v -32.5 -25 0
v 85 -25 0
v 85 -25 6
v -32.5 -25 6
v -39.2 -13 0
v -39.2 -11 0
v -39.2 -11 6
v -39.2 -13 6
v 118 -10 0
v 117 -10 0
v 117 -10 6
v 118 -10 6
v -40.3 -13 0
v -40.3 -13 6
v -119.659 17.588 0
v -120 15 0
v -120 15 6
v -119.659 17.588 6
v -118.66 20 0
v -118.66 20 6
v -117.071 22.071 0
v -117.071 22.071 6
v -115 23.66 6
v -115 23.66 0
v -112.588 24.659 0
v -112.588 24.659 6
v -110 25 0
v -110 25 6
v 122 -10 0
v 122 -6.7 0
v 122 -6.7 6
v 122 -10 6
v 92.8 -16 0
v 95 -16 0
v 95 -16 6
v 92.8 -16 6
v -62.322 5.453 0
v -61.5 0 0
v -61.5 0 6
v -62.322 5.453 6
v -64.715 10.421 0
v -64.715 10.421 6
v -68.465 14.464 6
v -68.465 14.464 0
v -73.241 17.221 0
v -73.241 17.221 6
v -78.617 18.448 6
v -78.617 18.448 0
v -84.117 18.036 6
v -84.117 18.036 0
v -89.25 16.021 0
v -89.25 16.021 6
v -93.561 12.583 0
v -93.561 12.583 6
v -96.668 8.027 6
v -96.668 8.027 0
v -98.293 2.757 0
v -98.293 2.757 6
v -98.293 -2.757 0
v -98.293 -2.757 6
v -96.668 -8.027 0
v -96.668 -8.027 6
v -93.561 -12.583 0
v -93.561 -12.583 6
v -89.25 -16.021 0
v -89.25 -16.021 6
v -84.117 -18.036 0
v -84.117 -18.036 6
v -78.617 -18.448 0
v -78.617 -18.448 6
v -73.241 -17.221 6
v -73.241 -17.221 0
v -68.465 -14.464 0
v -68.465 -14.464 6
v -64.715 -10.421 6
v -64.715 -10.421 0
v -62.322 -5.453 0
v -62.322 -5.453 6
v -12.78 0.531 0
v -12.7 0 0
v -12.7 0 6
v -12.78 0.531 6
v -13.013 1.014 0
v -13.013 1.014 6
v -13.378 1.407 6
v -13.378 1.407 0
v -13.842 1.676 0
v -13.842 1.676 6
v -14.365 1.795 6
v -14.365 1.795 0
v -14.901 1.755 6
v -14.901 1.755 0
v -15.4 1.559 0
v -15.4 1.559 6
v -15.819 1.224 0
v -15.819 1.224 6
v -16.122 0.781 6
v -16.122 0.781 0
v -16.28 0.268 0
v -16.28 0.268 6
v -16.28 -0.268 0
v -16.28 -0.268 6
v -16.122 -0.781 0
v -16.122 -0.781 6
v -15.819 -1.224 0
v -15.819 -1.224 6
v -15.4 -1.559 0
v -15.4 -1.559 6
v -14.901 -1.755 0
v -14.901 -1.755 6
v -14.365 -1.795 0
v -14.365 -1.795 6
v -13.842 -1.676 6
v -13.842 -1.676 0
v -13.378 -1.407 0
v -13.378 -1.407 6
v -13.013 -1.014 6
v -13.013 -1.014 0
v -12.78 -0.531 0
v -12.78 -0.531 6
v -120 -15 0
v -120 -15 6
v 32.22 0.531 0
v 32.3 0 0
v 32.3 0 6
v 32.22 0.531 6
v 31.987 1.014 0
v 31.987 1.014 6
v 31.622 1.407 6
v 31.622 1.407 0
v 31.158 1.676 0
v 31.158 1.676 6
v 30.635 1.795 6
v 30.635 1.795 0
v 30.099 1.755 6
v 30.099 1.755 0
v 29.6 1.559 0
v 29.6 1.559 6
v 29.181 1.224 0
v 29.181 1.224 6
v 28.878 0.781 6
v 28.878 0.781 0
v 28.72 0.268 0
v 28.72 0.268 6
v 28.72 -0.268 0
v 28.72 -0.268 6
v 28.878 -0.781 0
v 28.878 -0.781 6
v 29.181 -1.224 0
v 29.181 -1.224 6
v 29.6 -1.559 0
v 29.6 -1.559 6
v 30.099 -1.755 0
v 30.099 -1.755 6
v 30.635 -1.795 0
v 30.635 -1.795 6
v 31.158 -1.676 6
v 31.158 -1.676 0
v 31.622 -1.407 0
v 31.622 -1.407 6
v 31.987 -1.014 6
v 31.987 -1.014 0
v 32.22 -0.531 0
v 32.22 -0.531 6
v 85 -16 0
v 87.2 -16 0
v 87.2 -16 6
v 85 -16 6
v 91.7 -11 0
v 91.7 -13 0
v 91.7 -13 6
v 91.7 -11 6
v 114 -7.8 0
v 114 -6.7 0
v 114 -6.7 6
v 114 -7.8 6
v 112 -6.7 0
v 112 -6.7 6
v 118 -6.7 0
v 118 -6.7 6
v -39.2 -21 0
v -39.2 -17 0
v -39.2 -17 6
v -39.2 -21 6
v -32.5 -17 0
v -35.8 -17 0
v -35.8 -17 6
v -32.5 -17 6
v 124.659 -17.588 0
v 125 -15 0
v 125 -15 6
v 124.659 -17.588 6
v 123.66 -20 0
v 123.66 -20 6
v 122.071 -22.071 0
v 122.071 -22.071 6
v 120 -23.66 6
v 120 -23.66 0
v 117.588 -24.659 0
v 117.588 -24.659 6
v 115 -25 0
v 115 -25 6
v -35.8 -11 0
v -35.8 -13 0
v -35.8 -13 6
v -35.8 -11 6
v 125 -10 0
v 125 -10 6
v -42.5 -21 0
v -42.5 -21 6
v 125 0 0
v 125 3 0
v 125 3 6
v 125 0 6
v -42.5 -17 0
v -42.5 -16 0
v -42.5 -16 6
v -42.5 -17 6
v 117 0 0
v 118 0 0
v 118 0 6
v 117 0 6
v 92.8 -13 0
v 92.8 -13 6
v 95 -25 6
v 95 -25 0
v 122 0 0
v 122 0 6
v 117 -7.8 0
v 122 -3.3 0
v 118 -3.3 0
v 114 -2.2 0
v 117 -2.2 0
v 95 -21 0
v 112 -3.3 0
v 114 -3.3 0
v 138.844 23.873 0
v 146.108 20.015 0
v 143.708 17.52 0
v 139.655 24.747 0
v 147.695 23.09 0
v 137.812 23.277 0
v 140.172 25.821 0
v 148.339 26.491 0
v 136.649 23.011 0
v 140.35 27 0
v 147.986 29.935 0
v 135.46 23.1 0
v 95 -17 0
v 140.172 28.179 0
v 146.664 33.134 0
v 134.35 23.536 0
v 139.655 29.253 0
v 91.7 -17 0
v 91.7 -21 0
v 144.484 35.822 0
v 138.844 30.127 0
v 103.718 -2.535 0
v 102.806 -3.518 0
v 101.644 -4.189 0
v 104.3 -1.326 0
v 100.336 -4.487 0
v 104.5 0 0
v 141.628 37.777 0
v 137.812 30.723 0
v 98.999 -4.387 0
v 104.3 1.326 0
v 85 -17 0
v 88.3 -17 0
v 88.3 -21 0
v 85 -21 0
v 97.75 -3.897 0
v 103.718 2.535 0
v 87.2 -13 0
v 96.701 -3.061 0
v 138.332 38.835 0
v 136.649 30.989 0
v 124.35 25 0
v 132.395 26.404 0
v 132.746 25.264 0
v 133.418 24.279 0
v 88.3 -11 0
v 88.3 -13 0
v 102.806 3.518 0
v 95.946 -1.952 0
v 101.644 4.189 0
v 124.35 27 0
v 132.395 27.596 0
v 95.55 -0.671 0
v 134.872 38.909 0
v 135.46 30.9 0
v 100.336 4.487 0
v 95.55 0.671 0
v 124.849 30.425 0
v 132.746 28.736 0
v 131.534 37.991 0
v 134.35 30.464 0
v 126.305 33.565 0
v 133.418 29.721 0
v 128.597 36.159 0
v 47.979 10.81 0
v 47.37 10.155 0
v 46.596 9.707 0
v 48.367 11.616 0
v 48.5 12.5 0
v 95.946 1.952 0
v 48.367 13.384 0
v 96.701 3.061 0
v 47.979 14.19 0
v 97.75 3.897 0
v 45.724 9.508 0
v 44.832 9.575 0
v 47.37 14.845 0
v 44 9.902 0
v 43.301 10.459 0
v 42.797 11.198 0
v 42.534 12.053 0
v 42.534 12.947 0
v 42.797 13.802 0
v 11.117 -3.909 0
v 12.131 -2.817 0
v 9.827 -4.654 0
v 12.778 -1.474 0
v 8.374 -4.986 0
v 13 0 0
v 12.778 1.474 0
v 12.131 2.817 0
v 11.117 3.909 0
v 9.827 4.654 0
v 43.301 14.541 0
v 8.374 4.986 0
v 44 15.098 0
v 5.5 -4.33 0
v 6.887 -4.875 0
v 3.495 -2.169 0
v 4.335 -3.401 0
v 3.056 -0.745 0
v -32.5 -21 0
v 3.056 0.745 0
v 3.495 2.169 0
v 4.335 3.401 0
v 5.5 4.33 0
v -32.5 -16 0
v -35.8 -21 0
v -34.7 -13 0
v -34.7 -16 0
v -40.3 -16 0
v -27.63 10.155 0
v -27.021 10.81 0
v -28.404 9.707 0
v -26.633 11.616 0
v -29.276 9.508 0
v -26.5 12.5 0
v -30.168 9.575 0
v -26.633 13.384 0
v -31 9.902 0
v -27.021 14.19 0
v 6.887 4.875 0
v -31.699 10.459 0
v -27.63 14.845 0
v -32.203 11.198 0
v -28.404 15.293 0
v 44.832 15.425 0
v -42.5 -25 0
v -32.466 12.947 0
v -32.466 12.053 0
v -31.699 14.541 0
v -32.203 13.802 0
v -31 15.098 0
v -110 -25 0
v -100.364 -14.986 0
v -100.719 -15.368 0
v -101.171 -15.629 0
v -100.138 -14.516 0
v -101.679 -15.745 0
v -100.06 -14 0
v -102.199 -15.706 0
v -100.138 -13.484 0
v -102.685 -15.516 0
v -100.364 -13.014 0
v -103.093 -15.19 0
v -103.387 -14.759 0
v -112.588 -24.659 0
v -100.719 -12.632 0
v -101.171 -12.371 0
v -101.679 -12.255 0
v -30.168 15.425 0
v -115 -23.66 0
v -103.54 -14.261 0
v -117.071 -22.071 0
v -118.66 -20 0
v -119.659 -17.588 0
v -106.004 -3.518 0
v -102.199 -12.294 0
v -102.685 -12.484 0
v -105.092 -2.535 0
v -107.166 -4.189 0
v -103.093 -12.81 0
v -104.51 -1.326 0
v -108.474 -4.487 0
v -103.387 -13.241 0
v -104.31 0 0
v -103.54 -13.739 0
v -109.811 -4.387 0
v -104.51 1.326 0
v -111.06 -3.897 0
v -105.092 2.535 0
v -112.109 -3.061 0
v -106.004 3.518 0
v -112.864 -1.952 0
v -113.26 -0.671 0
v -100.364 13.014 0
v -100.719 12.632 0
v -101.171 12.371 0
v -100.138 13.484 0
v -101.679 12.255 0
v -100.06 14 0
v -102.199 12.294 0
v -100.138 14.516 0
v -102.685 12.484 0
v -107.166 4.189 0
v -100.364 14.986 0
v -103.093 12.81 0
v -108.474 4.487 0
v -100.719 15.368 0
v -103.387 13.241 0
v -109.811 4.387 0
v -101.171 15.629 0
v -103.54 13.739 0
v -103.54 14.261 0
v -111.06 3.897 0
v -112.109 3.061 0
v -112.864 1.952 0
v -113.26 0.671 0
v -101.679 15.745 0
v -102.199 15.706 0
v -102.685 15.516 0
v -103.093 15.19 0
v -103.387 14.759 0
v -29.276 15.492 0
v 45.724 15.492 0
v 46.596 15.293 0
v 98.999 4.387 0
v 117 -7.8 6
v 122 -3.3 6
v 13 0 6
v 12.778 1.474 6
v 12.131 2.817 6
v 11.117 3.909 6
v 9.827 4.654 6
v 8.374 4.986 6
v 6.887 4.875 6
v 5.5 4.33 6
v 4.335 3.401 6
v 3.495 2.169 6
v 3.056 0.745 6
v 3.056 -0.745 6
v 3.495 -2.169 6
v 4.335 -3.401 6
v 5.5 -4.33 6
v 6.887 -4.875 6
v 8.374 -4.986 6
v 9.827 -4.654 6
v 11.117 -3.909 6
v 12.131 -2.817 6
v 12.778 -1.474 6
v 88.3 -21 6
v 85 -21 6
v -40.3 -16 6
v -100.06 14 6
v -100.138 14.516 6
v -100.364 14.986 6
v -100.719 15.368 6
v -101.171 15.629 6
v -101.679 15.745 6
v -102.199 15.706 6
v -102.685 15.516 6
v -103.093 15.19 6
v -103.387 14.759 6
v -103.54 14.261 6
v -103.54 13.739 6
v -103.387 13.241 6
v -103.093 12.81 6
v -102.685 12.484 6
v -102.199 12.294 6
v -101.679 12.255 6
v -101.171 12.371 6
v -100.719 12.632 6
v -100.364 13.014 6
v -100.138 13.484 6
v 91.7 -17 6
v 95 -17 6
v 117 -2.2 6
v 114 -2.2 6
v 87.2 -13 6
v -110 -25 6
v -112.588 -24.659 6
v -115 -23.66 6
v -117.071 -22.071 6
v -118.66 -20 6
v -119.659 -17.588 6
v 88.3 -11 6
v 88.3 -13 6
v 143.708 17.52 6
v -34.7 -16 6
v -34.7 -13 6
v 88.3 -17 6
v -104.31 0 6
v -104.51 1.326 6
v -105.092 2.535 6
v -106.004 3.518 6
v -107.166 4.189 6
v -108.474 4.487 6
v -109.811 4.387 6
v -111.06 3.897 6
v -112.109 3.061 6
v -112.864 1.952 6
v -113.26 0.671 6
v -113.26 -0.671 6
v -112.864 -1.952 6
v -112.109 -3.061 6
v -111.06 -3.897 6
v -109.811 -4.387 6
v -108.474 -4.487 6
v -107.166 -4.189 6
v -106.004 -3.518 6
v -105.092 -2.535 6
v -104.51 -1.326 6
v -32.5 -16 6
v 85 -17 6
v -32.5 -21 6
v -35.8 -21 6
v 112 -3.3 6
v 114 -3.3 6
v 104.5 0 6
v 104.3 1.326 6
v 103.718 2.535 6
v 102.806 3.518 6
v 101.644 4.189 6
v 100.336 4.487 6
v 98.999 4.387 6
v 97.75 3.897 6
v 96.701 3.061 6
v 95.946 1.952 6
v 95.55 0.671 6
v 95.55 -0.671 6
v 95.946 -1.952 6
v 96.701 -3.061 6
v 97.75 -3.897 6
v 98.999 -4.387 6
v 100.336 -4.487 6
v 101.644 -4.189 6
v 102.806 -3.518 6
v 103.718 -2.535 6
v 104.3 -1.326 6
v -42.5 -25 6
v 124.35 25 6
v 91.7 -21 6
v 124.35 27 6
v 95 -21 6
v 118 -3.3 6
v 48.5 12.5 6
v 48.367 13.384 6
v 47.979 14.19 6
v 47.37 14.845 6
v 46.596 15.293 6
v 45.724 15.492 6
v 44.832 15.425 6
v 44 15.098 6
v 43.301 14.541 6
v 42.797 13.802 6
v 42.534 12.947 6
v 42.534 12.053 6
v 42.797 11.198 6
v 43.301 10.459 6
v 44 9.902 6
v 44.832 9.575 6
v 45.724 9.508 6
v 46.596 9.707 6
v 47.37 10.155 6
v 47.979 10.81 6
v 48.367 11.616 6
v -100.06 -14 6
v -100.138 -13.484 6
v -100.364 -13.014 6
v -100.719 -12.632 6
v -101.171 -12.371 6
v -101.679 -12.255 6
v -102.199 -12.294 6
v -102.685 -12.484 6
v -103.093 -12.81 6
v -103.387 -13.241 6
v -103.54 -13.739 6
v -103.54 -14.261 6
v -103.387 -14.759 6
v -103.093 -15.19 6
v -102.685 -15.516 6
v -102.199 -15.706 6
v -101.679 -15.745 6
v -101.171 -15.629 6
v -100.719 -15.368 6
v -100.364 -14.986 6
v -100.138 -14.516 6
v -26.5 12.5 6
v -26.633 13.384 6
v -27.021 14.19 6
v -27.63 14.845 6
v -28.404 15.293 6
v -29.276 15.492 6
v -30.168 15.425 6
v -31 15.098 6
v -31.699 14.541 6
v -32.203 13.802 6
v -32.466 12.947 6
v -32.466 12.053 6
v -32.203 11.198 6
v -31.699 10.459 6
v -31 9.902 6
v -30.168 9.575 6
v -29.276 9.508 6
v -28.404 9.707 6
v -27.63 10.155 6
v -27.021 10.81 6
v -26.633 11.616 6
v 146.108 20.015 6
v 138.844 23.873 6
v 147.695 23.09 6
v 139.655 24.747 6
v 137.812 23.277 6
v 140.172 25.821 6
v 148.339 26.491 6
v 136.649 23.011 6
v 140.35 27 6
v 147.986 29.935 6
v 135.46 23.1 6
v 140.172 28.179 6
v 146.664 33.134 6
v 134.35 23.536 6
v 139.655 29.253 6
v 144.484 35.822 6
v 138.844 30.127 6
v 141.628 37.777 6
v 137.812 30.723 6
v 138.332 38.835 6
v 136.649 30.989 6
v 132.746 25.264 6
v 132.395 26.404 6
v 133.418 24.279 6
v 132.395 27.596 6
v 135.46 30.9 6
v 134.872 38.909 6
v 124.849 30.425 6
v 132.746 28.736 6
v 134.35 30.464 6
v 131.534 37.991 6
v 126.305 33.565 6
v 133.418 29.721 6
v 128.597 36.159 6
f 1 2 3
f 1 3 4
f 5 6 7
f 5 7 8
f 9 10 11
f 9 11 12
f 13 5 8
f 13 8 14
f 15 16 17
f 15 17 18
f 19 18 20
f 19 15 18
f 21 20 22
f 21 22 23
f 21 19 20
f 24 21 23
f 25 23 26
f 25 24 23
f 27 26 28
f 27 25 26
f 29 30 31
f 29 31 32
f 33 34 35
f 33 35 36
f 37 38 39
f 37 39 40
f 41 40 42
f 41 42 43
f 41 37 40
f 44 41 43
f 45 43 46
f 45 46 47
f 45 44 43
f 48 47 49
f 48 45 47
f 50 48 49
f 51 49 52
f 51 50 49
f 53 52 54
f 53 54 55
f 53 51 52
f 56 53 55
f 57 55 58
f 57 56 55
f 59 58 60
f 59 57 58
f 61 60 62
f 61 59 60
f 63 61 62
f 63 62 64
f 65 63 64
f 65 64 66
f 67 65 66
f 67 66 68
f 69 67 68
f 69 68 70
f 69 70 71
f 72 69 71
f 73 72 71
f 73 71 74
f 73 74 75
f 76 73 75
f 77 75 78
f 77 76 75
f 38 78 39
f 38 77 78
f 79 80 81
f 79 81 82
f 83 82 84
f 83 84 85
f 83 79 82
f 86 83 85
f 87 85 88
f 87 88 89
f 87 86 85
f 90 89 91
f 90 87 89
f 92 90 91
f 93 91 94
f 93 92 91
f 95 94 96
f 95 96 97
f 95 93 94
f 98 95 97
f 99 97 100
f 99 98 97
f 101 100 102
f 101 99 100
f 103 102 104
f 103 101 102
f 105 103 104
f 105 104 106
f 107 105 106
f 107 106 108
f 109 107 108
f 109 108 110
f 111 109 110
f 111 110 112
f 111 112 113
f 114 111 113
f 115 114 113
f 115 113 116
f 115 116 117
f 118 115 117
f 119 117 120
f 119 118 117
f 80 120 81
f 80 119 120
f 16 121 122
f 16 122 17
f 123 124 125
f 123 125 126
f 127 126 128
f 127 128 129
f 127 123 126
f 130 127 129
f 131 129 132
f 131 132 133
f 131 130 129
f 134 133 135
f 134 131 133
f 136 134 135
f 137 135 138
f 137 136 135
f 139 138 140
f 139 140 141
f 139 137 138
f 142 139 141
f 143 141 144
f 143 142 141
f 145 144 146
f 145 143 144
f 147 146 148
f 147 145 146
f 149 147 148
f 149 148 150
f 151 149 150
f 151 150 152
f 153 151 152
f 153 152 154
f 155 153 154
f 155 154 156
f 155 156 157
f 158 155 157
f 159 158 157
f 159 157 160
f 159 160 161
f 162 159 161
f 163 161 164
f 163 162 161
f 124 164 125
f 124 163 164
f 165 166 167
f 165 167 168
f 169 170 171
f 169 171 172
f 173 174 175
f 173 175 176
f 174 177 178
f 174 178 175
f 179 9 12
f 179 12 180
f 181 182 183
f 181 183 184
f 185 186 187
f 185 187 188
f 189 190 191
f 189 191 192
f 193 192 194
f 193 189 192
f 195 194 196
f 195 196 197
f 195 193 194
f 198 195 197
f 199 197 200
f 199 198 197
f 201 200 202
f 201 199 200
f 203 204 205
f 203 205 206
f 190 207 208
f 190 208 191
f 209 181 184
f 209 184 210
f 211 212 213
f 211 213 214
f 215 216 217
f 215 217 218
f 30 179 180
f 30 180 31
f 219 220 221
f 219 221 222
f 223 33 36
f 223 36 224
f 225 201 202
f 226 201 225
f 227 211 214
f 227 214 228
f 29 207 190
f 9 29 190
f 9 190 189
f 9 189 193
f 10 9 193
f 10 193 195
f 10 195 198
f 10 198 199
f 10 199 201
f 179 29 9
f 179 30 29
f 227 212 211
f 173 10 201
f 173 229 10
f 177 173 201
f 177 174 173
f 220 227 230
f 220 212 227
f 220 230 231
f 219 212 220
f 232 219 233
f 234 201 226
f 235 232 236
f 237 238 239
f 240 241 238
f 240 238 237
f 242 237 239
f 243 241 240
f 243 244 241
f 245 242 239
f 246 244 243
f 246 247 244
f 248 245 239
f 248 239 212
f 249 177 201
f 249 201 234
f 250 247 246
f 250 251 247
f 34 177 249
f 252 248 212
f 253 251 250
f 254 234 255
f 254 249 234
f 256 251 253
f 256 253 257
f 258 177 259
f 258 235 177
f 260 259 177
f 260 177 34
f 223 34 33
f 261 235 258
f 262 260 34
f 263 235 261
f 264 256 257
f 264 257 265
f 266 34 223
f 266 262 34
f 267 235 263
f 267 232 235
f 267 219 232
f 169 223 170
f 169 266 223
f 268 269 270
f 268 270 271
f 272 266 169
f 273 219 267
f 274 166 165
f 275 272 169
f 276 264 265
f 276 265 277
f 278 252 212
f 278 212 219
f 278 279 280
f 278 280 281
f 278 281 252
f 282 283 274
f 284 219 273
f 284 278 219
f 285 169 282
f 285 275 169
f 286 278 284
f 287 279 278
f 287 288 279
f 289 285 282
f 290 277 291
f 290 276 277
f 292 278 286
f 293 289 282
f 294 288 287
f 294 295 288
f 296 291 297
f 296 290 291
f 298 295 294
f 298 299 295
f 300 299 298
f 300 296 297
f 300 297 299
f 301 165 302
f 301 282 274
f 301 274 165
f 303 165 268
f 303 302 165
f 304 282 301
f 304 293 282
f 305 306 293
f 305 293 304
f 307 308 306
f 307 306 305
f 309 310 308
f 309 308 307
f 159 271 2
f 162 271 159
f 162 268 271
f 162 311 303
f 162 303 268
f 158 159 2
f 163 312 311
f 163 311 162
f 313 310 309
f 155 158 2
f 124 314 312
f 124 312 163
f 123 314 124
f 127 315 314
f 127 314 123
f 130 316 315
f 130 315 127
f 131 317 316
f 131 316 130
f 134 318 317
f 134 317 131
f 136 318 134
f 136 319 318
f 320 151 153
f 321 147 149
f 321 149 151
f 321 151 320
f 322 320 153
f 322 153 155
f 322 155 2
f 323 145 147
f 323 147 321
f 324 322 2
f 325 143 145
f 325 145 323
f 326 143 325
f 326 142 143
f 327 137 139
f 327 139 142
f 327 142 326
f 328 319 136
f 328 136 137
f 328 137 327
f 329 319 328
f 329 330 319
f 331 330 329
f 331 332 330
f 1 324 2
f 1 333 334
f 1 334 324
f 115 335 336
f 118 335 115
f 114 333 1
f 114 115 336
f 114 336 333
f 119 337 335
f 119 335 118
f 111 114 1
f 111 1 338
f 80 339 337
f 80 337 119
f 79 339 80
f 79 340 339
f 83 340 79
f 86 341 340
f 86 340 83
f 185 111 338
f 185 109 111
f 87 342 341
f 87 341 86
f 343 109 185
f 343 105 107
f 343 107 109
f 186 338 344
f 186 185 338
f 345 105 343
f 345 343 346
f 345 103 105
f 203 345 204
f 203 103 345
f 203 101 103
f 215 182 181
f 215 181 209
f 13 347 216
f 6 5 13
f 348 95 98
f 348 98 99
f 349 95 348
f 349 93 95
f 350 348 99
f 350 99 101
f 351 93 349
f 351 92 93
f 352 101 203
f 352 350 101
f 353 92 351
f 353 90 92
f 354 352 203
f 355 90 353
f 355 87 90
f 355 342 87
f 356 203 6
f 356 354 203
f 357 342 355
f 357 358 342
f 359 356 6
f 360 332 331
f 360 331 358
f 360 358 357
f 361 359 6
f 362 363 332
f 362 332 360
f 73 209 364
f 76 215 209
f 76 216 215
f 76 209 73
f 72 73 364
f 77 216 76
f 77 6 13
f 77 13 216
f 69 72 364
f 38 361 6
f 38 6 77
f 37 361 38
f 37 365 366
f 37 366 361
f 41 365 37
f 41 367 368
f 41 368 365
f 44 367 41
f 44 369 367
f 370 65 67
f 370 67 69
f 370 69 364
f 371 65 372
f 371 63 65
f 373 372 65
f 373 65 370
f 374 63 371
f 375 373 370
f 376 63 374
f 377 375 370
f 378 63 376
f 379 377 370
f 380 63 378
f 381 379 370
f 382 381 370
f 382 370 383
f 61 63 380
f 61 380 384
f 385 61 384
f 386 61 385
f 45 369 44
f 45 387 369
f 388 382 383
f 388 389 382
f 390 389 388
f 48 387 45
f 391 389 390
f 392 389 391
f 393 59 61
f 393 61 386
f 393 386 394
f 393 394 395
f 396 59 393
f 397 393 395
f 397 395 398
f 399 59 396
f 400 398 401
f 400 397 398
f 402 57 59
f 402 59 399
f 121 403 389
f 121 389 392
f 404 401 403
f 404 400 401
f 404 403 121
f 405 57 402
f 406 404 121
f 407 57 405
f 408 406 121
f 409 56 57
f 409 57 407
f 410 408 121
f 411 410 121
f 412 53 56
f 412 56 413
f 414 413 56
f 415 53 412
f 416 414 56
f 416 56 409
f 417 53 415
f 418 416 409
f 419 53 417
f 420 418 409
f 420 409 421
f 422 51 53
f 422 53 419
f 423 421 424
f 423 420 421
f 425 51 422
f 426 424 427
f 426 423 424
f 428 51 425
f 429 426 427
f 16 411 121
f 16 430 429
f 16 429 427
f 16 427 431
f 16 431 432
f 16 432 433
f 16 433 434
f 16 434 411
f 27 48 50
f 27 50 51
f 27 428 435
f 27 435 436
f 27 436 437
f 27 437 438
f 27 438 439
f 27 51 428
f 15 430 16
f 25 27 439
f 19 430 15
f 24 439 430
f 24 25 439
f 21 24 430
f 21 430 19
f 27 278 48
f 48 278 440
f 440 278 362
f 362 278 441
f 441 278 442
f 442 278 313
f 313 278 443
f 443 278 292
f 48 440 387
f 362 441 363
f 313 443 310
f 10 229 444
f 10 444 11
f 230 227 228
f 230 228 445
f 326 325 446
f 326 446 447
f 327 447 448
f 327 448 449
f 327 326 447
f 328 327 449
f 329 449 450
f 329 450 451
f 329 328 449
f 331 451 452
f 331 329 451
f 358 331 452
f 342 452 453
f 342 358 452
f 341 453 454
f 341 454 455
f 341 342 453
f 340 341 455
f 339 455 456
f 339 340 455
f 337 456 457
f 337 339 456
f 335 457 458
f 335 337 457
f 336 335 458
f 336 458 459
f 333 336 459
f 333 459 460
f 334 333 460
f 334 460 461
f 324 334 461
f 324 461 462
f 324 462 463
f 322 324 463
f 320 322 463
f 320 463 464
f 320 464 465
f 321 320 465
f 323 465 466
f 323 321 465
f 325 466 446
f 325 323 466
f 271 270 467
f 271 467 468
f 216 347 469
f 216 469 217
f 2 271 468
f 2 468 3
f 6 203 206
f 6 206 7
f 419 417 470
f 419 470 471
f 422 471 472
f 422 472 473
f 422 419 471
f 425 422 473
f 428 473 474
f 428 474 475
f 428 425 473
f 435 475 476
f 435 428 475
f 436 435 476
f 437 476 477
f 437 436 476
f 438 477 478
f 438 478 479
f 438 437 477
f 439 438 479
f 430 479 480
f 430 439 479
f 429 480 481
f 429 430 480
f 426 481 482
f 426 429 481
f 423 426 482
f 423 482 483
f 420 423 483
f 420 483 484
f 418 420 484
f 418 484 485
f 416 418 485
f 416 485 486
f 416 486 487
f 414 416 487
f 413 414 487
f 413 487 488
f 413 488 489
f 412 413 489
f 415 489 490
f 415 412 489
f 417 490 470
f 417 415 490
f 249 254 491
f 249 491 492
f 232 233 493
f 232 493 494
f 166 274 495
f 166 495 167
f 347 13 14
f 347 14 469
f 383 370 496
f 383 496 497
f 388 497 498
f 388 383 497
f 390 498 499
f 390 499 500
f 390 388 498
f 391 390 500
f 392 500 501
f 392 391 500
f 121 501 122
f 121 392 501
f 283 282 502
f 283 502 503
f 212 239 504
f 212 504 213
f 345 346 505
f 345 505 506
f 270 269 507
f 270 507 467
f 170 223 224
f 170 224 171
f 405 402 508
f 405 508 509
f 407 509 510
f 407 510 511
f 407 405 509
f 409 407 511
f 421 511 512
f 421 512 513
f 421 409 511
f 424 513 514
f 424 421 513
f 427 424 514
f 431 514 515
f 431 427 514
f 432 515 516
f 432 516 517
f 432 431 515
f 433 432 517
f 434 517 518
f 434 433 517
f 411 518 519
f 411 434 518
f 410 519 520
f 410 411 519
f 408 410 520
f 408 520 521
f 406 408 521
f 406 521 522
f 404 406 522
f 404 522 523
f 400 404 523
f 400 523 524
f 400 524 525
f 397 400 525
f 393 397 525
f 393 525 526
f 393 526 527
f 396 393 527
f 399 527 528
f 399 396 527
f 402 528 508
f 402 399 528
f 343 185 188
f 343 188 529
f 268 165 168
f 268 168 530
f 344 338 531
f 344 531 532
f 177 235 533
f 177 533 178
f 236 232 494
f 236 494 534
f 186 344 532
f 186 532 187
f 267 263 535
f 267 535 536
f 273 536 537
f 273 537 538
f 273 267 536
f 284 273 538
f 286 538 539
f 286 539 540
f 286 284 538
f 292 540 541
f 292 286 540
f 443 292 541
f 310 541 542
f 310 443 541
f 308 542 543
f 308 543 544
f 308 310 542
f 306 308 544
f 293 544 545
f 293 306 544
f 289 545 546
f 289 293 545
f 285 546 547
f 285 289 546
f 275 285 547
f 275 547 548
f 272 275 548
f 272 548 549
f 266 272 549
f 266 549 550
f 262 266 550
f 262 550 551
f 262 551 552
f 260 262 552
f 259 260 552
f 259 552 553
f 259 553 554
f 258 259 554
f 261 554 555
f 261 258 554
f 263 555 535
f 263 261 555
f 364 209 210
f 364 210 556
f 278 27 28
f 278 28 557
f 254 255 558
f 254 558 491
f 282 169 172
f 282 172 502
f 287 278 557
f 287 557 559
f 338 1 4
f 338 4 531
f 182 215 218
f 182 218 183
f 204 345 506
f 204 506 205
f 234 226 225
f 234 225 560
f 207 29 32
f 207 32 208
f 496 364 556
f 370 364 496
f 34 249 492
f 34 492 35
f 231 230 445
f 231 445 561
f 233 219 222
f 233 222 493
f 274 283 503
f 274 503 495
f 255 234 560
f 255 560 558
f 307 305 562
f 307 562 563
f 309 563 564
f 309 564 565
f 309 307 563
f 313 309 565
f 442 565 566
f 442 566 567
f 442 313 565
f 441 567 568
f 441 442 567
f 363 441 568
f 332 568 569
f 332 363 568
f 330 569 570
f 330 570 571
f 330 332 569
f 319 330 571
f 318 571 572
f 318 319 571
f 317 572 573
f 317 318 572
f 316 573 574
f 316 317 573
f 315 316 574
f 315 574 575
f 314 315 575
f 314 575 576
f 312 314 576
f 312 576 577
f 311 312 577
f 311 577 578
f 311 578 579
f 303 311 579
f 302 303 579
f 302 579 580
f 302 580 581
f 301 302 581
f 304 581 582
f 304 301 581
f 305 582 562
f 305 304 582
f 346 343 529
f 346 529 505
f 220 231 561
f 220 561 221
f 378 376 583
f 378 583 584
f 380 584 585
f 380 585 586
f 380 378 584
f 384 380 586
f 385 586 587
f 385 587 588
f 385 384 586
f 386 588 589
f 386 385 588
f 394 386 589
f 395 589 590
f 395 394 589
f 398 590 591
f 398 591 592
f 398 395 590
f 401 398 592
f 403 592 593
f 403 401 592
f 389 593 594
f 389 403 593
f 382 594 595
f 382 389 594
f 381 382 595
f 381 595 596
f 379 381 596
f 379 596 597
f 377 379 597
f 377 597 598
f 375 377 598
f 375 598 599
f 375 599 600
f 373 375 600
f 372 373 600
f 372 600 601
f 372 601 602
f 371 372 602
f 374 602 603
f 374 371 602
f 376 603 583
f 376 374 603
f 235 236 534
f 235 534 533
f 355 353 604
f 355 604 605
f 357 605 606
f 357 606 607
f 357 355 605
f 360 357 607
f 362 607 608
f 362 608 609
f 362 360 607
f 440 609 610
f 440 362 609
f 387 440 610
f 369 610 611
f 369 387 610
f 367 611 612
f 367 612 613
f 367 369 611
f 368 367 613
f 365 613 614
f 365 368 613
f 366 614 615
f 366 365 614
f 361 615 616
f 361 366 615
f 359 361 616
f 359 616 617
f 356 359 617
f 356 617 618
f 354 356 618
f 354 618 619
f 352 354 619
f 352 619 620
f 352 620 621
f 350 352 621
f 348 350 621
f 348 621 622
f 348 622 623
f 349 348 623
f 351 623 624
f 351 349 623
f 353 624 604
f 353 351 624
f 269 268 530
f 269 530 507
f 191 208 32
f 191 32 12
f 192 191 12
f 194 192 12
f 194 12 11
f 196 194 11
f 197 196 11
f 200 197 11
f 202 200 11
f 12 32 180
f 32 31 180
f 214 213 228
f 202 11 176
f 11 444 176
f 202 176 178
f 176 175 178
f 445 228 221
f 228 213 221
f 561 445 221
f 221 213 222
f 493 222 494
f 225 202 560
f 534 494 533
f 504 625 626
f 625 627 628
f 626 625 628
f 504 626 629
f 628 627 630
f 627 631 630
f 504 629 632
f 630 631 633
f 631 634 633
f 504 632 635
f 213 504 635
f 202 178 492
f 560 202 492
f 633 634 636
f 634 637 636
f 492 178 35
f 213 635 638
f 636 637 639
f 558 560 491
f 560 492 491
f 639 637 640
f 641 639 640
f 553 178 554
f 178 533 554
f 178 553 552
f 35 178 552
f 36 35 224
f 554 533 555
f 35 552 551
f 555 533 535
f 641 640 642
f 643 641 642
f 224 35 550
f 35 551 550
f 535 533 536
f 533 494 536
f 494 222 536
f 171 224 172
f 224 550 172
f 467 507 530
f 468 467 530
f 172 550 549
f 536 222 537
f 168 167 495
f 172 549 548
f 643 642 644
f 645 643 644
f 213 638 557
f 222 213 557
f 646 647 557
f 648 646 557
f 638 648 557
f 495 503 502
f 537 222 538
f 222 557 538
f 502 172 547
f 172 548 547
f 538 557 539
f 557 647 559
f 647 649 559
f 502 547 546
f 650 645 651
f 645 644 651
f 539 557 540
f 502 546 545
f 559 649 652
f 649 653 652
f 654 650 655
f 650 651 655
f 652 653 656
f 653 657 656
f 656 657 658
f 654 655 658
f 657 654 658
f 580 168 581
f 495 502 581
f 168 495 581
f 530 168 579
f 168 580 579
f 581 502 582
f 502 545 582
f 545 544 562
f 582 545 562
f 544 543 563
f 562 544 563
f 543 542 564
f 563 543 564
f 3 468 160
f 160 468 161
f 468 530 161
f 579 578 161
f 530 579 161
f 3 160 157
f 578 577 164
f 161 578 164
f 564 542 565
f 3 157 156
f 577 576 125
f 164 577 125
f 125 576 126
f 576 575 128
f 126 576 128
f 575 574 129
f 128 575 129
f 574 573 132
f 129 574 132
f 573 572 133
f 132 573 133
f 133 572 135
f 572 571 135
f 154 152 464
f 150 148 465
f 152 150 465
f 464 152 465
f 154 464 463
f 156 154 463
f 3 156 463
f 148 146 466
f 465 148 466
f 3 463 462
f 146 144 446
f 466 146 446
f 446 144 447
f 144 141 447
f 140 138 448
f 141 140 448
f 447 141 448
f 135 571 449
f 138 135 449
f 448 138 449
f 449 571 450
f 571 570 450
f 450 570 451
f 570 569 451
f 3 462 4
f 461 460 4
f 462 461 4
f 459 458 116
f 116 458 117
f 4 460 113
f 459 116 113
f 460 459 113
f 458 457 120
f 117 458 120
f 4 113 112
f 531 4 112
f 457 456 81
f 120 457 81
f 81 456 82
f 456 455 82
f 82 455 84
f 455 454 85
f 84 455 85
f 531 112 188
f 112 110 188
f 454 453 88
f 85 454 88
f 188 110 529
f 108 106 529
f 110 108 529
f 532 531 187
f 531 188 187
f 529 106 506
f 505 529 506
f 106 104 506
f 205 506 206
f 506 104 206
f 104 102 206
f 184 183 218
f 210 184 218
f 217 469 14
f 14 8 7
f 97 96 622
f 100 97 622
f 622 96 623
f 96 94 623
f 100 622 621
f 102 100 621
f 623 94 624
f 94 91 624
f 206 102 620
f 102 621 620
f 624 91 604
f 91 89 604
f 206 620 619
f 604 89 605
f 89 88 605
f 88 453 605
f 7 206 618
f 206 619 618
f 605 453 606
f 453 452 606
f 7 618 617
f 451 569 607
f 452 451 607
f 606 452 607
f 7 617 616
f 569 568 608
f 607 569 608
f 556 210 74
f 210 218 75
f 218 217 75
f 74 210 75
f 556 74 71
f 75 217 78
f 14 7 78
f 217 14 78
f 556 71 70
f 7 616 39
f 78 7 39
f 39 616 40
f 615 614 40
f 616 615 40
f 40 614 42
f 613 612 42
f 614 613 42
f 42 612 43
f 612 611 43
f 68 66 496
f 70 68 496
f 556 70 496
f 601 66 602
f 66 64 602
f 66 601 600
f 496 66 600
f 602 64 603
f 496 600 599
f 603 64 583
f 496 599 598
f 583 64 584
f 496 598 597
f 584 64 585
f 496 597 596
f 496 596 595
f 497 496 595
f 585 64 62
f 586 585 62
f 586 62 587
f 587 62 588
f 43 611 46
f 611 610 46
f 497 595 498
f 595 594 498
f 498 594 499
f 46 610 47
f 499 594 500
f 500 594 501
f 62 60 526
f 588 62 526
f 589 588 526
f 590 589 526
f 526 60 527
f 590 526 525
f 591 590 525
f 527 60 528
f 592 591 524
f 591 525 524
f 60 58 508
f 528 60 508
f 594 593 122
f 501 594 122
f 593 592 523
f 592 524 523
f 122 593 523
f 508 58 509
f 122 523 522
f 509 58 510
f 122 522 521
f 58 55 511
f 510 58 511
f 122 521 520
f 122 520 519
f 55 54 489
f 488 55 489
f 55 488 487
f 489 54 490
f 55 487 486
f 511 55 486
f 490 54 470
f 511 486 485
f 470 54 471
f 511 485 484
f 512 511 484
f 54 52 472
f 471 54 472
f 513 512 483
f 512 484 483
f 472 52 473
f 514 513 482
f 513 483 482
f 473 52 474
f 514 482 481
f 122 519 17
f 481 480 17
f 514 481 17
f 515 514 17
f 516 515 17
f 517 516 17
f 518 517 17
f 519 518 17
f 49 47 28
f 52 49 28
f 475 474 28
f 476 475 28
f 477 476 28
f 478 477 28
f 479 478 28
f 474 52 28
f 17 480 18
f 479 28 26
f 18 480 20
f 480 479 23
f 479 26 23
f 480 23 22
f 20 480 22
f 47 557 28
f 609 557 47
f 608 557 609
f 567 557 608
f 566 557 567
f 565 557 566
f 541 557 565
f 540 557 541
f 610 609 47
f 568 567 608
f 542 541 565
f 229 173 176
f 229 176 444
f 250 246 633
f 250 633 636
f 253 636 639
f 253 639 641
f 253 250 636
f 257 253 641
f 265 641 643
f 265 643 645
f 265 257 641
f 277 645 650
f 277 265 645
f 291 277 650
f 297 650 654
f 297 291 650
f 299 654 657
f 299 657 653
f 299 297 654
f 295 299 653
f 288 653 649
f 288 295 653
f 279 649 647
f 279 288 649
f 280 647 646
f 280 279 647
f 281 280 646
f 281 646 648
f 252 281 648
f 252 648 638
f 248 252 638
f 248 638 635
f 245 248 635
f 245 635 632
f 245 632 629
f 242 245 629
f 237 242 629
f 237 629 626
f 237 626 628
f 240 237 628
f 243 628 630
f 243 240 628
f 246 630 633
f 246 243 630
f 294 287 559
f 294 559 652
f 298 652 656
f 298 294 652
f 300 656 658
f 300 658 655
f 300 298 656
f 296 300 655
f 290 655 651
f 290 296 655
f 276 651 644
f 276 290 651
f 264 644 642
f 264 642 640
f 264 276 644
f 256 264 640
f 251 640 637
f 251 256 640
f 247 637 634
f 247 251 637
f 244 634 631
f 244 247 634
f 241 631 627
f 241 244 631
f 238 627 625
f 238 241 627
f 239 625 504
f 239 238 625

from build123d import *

# Parameters (mm, degrees)
ESBO_O1_R                = 18.5
ESBO_O1_R_2              = 4.5
ESBO_O1_R_3              = 4
ESBO_O1_R_4              = 5
ESBO_O1_R_5              = 1.8
ESBO_O1_R_6              = 3
ESBO_O1_R_7              = 1.75
RESSALTO_EXTRUS_O1_DEPTH = 6


with BuildPart() as part:
    # Esboço1 → Ressalto-extrusão1 (new body)
    with BuildSketch(Plane.XY):
        with BuildLine():
            Line((95, -25), (95, -21))
            Line((95, -21), (91.7, -21))
            Line((91.7, -21), (91.7, -17))
            Line((91.7, -17), (95, -17))
            Line((95, -17), (95, -16))
            Line((95, -16), (92.8, -16))
            Line((92.8, -16), (92.8, -13))
            Line((92.8, -13), (91.7, -13))
            Line((91.7, -13), (91.7, -11))
            Line((91.7, -11), (88.3, -11))
            Line((88.3, -11), (88.3, -13))
            Line((88.3, -13), (87.2, -13))
            Line((87.2, -13), (87.2, -16))
            Line((87.2, -16), (85, -16))
            Line((85, -16), (85, -17))
            Line((85, -17), (88.3, -17))
            Line((88.3, -17), (88.3, -21))
            Line((88.3, -21), (85, -21))
            Line((85, -21), (85, -25))
            Line((85, -25), (-32.5, -25))
            Line((-32.5, -25), (-32.5, -21))
            Line((-32.5, -21), (-35.8, -21))
            Line((-35.8, -21), (-35.8, -17))
            Line((-35.8, -17), (-32.5, -17))
            Line((-32.5, -17), (-32.5, -16))
            Line((-32.5, -16), (-34.7, -16))
            Line((-34.7, -16), (-34.7, -13))
            Line((-34.7, -13), (-35.8, -13))
            Line((-35.8, -13), (-35.8, -11))
            Line((-35.8, -11), (-39.2, -11))
            Line((-39.2, -11), (-39.2, -13))
            Line((-39.2, -13), (-40.3, -13))
            Line((-40.3, -13), (-40.3, -16))
            Line((-40.3, -16), (-42.5, -16))
            Line((-42.5, -16), (-42.5, -17))
            Line((-42.5, -17), (-39.2, -17))
            Line((-39.2, -17), (-39.2, -21))
            Line((-39.2, -21), (-42.5, -21))
            Line((-42.5, -21), (-42.5, -25))
            Line((-42.5, -25), (-110, -25))
            ThreePointArc((-110, -25), (-117.071067812, -22.071067812), (-120, -15))
            Line((-120, -15), (-120, 15))
            ThreePointArc((-120, 15), (-117.071067812, 22.071067812), (-110, 25))
            Line((-110, 25), (124.350151348, 25))
            Line((124.350151348, 25), (124.350151348, 27))
            ThreePointArc((124.350151348, 27), (141.627798395, 37.777125853), (143.707891624, 17.520355595))
            Line((143.707891624, 17.520355595), (125, 3))
            Line((125, 3), (125, 0))
            Line((125, 0), (122, 0))
            Line((122, 0), (122, -3.3))
            Line((122, -3.3), (118, -3.3))
            Line((118, -3.3), (118, 0))
            Line((118, 0), (117, 0))
            Line((117, 0), (117, -2.2))
            Line((117, -2.2), (114, -2.2))
            Line((114, -2.2), (114, -3.3))
            Line((114, -3.3), (112, -3.3))
            Line((112, -3.3), (112, -6.7))
            Line((112, -6.7), (114, -6.7))
            Line((114, -6.7), (114, -7.8))
            Line((114, -7.8), (117, -7.8))
            Line((117, -7.8), (117, -10))
            Line((117, -10), (118, -10))
            Line((118, -10), (118, -6.7))
            Line((118, -6.7), (122, -6.7))
            Line((122, -6.7), (122, -10))
            Line((122, -10), (125, -10))
            Line((125, -10), (125, -15))
            ThreePointArc((125, -15), (122.071067812, -22.071067812), (115, -25))
            Line((115, -25), (95, -25))
        make_face()
        with Locations((-80, 0)):
            Circle(ESBO_O1_R, mode=Mode.SUBTRACT)
        with Locations((100, 0)):
            Circle(ESBO_O1_R_2, mode=Mode.SUBTRACT)
        with Locations((136.350151348, 27)):
            Circle(ESBO_O1_R_3, mode=Mode.SUBTRACT)
        with Locations((8, 0)):
            Circle(ESBO_O1_R_4, mode=Mode.SUBTRACT)
        with Locations((-108.81, 0)):
            Circle(ESBO_O1_R_2, mode=Mode.SUBTRACT)
        with Locations((-14.5, 0)):
            Circle(ESBO_O1_R_5, mode=Mode.SUBTRACT)
        with Locations((30.5, 0)):
            Circle(ESBO_O1_R_5, mode=Mode.SUBTRACT)
        with Locations((-29.5, 12.5)):
            Circle(ESBO_O1_R_6, mode=Mode.SUBTRACT)
        with Locations((45.5, 12.5)):
            Circle(ESBO_O1_R_6, mode=Mode.SUBTRACT)
        with Locations((-101.81, 14)):
            Circle(ESBO_O1_R_7, mode=Mode.SUBTRACT)
        with Locations((-101.81, -14)):
            Circle(ESBO_O1_R_7, mode=Mode.SUBTRACT)
    extrude(amount=RESSALTO_EXTRUS_O1_DEPTH)


solid = part.part
